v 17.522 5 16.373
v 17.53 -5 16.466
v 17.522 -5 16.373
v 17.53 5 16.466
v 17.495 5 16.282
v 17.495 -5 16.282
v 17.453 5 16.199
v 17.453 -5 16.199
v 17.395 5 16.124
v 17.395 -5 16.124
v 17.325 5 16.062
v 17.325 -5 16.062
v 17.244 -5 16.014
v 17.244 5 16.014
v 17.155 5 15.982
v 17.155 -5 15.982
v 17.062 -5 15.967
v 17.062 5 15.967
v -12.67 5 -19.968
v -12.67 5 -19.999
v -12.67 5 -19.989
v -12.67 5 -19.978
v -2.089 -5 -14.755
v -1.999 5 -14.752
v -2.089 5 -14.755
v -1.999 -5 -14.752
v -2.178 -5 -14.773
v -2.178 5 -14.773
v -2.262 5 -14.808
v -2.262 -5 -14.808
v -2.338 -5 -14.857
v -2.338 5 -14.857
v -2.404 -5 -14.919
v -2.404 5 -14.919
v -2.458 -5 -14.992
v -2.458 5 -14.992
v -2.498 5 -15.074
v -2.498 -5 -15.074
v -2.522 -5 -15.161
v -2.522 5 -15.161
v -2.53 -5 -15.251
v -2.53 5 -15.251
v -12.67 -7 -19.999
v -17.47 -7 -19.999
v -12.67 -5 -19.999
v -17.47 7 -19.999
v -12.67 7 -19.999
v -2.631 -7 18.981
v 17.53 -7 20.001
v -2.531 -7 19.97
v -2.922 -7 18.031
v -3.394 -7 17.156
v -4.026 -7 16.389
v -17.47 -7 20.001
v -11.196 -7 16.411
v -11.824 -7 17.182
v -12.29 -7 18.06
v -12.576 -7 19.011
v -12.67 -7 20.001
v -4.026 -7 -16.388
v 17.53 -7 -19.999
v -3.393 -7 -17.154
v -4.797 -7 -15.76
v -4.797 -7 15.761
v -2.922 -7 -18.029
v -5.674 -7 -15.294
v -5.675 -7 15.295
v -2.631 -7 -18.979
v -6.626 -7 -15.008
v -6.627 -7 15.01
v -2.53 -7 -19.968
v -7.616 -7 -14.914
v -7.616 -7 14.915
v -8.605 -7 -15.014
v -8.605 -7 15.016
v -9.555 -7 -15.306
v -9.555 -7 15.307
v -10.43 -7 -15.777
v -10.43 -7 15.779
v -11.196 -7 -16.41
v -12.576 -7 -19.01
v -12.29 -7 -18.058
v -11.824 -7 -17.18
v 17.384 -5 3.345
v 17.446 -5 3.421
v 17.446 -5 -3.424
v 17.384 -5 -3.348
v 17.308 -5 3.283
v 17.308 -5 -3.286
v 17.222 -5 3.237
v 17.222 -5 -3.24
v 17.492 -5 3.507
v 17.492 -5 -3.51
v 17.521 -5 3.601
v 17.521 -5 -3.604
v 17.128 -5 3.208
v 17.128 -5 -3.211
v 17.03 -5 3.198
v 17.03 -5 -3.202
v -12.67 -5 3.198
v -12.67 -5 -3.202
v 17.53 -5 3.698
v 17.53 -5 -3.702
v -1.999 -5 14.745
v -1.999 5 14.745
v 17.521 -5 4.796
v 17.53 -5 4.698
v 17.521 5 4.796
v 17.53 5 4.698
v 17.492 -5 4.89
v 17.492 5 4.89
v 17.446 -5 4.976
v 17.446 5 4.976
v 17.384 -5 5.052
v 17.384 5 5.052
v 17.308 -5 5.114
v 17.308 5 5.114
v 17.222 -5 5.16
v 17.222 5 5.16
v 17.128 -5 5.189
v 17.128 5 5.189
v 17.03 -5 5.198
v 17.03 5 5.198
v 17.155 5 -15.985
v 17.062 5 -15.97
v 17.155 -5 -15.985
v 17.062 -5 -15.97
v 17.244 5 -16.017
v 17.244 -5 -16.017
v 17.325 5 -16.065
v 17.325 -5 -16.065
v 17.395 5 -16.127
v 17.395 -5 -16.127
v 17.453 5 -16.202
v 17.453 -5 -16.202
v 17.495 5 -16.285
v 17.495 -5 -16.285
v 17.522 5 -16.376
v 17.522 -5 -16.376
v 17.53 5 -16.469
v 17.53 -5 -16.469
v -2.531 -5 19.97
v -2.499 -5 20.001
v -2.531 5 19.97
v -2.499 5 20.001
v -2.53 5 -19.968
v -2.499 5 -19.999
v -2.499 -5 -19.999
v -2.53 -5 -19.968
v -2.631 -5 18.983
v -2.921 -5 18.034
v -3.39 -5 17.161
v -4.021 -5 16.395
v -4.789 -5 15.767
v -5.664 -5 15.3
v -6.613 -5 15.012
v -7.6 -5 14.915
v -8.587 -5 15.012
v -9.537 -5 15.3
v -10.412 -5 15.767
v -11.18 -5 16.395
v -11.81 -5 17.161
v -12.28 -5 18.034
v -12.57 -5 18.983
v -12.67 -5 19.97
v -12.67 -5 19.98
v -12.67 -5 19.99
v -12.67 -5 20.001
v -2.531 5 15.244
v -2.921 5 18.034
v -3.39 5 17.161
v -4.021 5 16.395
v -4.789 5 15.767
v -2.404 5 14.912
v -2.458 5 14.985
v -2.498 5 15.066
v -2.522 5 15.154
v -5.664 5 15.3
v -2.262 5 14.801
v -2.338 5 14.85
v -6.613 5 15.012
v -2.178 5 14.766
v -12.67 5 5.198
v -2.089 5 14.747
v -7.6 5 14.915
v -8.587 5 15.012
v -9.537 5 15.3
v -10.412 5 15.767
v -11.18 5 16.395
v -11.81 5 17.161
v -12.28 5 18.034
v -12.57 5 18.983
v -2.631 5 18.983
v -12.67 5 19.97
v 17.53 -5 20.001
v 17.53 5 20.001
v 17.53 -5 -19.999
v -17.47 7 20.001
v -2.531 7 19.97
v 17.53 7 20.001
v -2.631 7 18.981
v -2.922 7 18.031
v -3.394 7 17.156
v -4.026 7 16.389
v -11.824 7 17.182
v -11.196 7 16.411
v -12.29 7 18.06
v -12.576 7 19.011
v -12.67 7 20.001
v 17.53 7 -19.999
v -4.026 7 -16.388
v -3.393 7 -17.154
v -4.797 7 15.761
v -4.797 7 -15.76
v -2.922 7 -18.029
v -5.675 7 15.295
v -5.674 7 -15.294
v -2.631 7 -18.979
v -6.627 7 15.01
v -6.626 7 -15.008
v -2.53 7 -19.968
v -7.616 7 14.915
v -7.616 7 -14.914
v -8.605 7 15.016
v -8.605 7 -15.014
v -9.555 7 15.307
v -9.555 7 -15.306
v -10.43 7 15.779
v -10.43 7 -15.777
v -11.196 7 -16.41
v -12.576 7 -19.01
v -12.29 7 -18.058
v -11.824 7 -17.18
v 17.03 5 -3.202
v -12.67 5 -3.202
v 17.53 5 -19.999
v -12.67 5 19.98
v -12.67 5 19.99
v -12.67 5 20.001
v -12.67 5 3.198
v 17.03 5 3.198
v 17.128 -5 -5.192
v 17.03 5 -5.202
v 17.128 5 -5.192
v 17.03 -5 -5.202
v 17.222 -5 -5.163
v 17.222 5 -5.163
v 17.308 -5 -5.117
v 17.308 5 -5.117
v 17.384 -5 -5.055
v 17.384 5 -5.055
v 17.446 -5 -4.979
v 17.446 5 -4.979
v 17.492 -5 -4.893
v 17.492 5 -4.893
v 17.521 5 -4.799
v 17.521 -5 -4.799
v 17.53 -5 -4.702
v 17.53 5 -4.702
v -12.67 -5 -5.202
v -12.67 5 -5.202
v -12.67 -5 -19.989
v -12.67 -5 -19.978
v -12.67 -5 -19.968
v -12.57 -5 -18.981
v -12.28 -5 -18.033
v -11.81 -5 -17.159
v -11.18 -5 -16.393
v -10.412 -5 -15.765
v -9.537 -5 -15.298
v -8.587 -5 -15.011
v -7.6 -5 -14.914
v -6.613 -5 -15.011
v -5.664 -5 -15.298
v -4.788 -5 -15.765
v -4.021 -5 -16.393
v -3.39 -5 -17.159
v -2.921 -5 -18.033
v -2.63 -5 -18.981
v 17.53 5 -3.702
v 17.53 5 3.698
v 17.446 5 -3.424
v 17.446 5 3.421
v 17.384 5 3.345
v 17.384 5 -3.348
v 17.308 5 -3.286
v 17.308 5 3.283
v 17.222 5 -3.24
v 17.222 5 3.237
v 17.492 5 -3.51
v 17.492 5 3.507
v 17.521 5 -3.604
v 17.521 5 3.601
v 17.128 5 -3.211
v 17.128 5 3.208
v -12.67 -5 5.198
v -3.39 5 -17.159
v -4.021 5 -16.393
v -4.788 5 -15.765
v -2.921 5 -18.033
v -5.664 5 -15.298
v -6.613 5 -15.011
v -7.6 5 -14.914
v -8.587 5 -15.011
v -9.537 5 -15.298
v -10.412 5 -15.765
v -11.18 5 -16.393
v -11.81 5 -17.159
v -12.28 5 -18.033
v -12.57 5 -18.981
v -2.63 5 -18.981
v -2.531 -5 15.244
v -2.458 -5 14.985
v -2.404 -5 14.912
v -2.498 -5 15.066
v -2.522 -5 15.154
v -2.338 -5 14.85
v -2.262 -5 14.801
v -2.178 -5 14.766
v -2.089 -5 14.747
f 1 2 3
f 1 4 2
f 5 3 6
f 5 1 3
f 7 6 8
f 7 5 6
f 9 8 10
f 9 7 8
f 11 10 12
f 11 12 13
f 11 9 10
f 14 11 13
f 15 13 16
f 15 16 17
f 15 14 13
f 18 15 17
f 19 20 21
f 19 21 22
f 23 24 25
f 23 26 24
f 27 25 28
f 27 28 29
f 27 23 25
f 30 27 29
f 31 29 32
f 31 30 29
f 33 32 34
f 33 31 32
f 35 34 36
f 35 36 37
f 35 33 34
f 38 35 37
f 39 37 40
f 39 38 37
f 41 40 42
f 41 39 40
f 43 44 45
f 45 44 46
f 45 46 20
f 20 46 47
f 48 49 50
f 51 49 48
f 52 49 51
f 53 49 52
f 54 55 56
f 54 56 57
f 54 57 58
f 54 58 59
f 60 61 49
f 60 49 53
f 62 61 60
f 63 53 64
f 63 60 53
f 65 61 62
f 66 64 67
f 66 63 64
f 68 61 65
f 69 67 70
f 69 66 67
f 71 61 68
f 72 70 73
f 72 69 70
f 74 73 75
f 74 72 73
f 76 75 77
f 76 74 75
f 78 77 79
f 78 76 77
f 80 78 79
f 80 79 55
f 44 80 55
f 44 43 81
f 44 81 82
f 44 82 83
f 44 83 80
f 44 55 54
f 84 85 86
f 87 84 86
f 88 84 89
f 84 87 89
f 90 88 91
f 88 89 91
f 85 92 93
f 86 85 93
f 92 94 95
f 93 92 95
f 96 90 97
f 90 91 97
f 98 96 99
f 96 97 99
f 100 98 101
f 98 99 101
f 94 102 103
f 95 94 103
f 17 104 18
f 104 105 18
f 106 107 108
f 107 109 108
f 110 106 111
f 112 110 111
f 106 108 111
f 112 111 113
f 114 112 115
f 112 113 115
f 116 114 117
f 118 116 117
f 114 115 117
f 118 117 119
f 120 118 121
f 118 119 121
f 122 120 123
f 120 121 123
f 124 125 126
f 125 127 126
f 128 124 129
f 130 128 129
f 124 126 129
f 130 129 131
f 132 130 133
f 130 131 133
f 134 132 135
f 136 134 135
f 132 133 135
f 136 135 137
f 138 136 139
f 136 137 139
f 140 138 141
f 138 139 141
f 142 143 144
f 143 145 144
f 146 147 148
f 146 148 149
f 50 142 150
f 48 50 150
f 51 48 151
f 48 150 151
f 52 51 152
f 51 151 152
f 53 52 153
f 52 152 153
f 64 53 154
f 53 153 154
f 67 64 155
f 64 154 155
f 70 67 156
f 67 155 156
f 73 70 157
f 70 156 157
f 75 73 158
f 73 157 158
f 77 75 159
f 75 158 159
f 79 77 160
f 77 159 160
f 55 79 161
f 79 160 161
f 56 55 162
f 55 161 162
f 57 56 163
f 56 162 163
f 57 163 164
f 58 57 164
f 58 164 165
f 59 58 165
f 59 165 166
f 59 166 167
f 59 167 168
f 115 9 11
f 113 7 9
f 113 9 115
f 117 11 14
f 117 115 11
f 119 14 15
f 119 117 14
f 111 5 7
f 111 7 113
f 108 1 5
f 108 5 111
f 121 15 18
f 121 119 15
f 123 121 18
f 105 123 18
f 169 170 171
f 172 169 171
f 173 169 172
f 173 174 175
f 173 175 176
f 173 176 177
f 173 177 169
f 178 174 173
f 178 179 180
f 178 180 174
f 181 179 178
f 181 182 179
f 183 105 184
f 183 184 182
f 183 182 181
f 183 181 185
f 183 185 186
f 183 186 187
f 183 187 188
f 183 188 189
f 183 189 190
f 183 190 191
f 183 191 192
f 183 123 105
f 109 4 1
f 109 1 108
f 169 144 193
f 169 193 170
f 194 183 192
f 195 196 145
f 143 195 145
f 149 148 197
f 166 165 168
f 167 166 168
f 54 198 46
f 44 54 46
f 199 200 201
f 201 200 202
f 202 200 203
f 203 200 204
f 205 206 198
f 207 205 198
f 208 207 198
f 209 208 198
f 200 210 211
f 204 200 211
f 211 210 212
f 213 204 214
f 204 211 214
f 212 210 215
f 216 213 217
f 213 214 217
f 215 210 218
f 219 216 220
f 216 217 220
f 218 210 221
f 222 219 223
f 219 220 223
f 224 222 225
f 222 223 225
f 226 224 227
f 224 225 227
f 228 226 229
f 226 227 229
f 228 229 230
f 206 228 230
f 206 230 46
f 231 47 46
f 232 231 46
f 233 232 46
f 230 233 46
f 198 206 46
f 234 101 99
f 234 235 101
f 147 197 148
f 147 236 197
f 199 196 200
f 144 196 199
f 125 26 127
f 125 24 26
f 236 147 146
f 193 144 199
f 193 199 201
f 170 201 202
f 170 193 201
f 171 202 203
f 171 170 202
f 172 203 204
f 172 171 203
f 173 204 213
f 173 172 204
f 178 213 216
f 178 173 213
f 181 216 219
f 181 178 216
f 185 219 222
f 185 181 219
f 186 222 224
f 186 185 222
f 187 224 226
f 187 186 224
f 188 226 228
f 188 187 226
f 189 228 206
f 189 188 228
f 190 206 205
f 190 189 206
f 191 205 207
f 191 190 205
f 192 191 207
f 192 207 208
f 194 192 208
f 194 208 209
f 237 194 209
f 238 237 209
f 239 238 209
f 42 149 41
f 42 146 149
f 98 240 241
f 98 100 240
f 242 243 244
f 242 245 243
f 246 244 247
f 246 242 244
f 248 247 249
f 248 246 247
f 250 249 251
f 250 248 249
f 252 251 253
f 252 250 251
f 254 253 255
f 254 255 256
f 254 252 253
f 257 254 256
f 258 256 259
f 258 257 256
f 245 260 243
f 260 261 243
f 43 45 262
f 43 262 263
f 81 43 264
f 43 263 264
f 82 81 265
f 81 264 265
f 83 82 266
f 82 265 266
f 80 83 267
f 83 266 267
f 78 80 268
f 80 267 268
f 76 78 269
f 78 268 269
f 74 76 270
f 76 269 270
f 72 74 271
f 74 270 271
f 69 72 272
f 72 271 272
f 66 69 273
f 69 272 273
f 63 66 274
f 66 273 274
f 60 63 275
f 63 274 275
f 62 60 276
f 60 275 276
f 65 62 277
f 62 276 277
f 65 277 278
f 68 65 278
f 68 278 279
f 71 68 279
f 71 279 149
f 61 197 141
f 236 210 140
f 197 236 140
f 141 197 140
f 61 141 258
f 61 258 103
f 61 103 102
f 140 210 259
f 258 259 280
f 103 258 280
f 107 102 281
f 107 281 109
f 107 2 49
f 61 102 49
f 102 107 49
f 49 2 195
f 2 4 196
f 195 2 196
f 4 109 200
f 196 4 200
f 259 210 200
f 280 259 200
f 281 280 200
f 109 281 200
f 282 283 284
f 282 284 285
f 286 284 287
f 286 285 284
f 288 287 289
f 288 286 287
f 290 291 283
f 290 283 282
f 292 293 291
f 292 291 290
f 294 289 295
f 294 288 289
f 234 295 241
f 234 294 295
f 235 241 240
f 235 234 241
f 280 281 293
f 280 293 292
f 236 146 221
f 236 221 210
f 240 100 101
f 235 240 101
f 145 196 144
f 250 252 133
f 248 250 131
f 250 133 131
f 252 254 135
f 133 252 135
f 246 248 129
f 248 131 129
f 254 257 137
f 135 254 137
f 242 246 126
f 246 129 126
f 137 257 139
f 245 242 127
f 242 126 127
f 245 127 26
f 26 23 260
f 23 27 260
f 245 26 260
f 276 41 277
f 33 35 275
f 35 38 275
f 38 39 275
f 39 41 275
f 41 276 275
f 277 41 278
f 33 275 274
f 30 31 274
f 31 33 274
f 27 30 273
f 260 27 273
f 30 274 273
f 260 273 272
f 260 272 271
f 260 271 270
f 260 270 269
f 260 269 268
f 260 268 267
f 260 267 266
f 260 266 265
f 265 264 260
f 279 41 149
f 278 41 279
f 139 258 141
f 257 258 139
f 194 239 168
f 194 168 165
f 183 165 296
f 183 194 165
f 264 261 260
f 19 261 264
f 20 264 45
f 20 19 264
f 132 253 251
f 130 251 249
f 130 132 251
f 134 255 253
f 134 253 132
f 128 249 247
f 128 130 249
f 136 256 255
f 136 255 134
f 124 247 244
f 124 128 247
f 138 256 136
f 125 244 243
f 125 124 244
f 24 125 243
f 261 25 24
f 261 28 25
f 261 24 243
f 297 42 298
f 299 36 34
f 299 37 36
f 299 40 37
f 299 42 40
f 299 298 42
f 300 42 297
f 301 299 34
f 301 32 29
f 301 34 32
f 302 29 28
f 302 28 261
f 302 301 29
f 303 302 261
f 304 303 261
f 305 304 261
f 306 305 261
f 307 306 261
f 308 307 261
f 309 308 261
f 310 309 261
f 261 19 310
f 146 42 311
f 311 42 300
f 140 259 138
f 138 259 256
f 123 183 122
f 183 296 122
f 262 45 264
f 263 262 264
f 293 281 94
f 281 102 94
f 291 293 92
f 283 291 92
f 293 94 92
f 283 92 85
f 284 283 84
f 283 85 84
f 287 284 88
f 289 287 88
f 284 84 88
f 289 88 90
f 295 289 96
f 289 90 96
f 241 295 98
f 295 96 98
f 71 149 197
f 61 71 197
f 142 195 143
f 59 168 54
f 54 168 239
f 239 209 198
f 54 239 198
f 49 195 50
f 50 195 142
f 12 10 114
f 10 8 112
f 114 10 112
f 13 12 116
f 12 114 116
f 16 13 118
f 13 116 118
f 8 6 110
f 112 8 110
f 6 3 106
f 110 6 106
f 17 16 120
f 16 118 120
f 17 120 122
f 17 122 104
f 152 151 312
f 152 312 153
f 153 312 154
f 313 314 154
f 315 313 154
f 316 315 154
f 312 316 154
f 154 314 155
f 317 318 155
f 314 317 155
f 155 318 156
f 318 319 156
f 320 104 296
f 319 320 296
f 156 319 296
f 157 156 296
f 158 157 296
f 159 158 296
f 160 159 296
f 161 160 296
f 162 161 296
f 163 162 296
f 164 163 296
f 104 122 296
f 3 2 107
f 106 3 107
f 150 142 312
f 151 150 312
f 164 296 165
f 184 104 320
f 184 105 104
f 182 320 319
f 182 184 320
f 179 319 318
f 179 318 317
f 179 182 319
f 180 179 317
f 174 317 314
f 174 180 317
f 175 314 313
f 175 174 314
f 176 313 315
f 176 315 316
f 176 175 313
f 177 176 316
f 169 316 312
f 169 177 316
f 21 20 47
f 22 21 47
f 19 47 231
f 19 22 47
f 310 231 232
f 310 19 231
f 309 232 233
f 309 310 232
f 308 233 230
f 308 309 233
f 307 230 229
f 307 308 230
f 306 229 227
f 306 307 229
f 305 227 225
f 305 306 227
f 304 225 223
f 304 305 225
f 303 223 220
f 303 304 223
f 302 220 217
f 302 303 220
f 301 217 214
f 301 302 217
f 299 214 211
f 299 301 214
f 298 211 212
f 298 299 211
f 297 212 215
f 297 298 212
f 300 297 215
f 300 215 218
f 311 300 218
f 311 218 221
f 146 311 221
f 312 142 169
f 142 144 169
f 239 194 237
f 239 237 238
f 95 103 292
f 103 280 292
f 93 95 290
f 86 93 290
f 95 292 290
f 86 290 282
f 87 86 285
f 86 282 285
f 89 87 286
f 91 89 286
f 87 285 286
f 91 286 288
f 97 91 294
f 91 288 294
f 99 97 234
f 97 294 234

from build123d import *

# Parameters (mm, degrees)
SALIENTE_EXTRUIR1_DEPTH   = 5
SALIENTE_EXTRUIR1_2_DEPTH = 5
CROQUIS1_W                = 4.860345515
CROQUIS1_H                = 40
SALIENTE_EXTRUIR1_3_DEPTH = 5
SALIENTE_EXTRUIR2_DEPTH   = 2
REDONDEO1_R               = 0.5
REDONDEO2_R               = 0.5
REDONDEO3_R               = 0.5
CROQUIS5_W                = 30.200510783
CROQUIS5_H                = 2
SALIENTE_EXTRUIR3_DEPTH   = 5
REDONDEO4_R               = 0.5
CROQUIS6_W                = 0.06
CROQUIS6_H                = 40
CORTAR_EXTRUIR4_DEPTH     = 17


with BuildPart() as part:
    # Croquis1 → Saliente-Extruir1 (new, symmetric)
    with BuildSketch(Plane(origin=(0, 0, 0), x_dir=(1, 0, 0), z_dir=(0, 1, 0))):
        Polygon((17.530428149, 19.999144472), (-2.49913463, 19.999144472), (-2.53039772, 19.968072403), (-2.53039772, 14.718192691), (17.530428149, 16.000273752), align=None)
    extrude(amount=SALIENTE_EXTRUIR1_DEPTH, both=True)



with BuildPart() as body_2:
    # Croquis1 → Saliente-Extruir1 2 (new, symmetric)
    with BuildSketch(Plane(origin=(0, 0, 0), x_dir=(1, 0, 0), z_dir=(0, 1, 0))):
        Polygon((17.530428149, -20.000855528), (-2.49913463, -20.000855528), (-2.530548466, -19.969634553), (-2.530548466, -14.710829577), (17.530428149, -15.997364244), align=None)
    extrude(amount=SALIENTE_EXTRUIR1_2_DEPTH, both=True)


with BuildPart() as body_3:
    # Croquis1 → Saliente-Extruir1 3 (new, symmetric)
    with BuildSketch(Plane(origin=(0, 0, 0), x_dir=(1, 0, 0), z_dir=(0, 1, 0))):
        with Locations((-15.100255392, -0.000855528)):
            Rectangle(CROQUIS1_W, CROQUIS1_H)
    extrude(amount=SALIENTE_EXTRUIR1_3_DEPTH, both=True)


with BuildPart() as part_1:
    add(part.part)

    add(body_2.part)  # Saliente-Extruir2 merges body 2

    add(body_3.part)  # Saliente-Extruir2 merges body 3
    # Croquis3 → Saliente-Extruir2 (add)
    with BuildSketch(Plane(origin=(0, 5, 0), x_dir=(1, 0, 0), z_dir=(0, 1, 0))):
        with BuildLine():
            Line((-17.530428149, 19.999144472), (-12.670082634, 19.999144472))
            ThreePointArc((-12.670082634, 19.999144472), (-7.615776211, 14.91376598), (-2.53039772, 19.968072403))
            Line((-2.53039772, 19.968072403), (17.530428149, 19.999144472))
            Line((17.530428149, 19.999144472), (17.530428149, -20.000855528))
            Line((17.530428149, -20.000855528), (-2.530548466, -19.969634553))
            ThreePointArc((-2.530548466, -19.969634553), (-7.615926037, -14.915477956), (-12.670082634, -20.000855528))
            Line((-12.670082634, -20.000855528), (-17.530428149, -20.000855528))
            Line((-17.530428149, -20.000855528), (-17.530428149, 19.999144472))
        make_face()
    saliente_extruir2 = extrude(amount=SALIENTE_EXTRUIR2_DEPTH)

    # Simetría1: Saliente-Extruir2 across plane
    add(saliente_extruir2.mirror(Plane.ZX))

    # Redondeo1
    redondeo1_edges = [part_1.edges().sort_by_distance(p)[0] for p in [
        (-2.530548466, 0, 14.710829577),
    ]]
    fillet(redondeo1_edges, radius=REDONDEO1_R)

    # Redondeo2
    redondeo2_edges = [part_1.edges().sort_by_distance(p)[0] for p in [
        (-2.53039772, 0, -14.718192691),
    ]]
    fillet(redondeo2_edges, radius=REDONDEO2_R)

    # Redondeo3
    redondeo3_edges = [part_1.edges().sort_by_distance(p)[0] for p in [
        (17.530428149, 0, 15.997364244),
        (17.530428149, 0, -16.000273752),
    ]]
    fillet(redondeo3_edges, radius=REDONDEO3_R)

    # Croquis5 → Saliente-Extruir3 (add, symmetric)
    with BuildSketch(Plane(origin=(0, 0, 0), x_dir=(1, 0, 0), z_dir=(0, 1, 0))):
        with Locations((2.430172758, -4.198493404)):
            Rectangle(CROQUIS5_W, CROQUIS5_H)
        with Locations((2.430172758, 4.201506596)):
            Rectangle(CROQUIS5_W, CROQUIS5_H)
    extrude(amount=SALIENTE_EXTRUIR3_DEPTH, both=True)

    # Redondeo4
    redondeo4_edges = [part_1.edges().sort_by_distance(p)[0] for p in [
        (17.530428149, 0, -3.201506596),
        (17.530428149, 0, -5.201506596),
        (17.530428149, 0, 5.198493404),
        (17.530428149, 0, 3.198493404),
    ]]
    fillet(redondeo4_edges, radius=REDONDEO4_R)

    # Croquis6 → Cortar-Extruir4 (cut)
    with BuildSketch(Plane(origin=(0, 7, 0), x_dir=(1, 0, 0), z_dir=(0, 1, 0))):
        with Locations((-17.500428149, -0.000855528)):
            Rectangle(CROQUIS6_W, CROQUIS6_H)
    extrude(amount=-CORTAR_EXTRUIR4_DEPTH, mode=Mode.SUBTRACT)


solid = part_1.part
